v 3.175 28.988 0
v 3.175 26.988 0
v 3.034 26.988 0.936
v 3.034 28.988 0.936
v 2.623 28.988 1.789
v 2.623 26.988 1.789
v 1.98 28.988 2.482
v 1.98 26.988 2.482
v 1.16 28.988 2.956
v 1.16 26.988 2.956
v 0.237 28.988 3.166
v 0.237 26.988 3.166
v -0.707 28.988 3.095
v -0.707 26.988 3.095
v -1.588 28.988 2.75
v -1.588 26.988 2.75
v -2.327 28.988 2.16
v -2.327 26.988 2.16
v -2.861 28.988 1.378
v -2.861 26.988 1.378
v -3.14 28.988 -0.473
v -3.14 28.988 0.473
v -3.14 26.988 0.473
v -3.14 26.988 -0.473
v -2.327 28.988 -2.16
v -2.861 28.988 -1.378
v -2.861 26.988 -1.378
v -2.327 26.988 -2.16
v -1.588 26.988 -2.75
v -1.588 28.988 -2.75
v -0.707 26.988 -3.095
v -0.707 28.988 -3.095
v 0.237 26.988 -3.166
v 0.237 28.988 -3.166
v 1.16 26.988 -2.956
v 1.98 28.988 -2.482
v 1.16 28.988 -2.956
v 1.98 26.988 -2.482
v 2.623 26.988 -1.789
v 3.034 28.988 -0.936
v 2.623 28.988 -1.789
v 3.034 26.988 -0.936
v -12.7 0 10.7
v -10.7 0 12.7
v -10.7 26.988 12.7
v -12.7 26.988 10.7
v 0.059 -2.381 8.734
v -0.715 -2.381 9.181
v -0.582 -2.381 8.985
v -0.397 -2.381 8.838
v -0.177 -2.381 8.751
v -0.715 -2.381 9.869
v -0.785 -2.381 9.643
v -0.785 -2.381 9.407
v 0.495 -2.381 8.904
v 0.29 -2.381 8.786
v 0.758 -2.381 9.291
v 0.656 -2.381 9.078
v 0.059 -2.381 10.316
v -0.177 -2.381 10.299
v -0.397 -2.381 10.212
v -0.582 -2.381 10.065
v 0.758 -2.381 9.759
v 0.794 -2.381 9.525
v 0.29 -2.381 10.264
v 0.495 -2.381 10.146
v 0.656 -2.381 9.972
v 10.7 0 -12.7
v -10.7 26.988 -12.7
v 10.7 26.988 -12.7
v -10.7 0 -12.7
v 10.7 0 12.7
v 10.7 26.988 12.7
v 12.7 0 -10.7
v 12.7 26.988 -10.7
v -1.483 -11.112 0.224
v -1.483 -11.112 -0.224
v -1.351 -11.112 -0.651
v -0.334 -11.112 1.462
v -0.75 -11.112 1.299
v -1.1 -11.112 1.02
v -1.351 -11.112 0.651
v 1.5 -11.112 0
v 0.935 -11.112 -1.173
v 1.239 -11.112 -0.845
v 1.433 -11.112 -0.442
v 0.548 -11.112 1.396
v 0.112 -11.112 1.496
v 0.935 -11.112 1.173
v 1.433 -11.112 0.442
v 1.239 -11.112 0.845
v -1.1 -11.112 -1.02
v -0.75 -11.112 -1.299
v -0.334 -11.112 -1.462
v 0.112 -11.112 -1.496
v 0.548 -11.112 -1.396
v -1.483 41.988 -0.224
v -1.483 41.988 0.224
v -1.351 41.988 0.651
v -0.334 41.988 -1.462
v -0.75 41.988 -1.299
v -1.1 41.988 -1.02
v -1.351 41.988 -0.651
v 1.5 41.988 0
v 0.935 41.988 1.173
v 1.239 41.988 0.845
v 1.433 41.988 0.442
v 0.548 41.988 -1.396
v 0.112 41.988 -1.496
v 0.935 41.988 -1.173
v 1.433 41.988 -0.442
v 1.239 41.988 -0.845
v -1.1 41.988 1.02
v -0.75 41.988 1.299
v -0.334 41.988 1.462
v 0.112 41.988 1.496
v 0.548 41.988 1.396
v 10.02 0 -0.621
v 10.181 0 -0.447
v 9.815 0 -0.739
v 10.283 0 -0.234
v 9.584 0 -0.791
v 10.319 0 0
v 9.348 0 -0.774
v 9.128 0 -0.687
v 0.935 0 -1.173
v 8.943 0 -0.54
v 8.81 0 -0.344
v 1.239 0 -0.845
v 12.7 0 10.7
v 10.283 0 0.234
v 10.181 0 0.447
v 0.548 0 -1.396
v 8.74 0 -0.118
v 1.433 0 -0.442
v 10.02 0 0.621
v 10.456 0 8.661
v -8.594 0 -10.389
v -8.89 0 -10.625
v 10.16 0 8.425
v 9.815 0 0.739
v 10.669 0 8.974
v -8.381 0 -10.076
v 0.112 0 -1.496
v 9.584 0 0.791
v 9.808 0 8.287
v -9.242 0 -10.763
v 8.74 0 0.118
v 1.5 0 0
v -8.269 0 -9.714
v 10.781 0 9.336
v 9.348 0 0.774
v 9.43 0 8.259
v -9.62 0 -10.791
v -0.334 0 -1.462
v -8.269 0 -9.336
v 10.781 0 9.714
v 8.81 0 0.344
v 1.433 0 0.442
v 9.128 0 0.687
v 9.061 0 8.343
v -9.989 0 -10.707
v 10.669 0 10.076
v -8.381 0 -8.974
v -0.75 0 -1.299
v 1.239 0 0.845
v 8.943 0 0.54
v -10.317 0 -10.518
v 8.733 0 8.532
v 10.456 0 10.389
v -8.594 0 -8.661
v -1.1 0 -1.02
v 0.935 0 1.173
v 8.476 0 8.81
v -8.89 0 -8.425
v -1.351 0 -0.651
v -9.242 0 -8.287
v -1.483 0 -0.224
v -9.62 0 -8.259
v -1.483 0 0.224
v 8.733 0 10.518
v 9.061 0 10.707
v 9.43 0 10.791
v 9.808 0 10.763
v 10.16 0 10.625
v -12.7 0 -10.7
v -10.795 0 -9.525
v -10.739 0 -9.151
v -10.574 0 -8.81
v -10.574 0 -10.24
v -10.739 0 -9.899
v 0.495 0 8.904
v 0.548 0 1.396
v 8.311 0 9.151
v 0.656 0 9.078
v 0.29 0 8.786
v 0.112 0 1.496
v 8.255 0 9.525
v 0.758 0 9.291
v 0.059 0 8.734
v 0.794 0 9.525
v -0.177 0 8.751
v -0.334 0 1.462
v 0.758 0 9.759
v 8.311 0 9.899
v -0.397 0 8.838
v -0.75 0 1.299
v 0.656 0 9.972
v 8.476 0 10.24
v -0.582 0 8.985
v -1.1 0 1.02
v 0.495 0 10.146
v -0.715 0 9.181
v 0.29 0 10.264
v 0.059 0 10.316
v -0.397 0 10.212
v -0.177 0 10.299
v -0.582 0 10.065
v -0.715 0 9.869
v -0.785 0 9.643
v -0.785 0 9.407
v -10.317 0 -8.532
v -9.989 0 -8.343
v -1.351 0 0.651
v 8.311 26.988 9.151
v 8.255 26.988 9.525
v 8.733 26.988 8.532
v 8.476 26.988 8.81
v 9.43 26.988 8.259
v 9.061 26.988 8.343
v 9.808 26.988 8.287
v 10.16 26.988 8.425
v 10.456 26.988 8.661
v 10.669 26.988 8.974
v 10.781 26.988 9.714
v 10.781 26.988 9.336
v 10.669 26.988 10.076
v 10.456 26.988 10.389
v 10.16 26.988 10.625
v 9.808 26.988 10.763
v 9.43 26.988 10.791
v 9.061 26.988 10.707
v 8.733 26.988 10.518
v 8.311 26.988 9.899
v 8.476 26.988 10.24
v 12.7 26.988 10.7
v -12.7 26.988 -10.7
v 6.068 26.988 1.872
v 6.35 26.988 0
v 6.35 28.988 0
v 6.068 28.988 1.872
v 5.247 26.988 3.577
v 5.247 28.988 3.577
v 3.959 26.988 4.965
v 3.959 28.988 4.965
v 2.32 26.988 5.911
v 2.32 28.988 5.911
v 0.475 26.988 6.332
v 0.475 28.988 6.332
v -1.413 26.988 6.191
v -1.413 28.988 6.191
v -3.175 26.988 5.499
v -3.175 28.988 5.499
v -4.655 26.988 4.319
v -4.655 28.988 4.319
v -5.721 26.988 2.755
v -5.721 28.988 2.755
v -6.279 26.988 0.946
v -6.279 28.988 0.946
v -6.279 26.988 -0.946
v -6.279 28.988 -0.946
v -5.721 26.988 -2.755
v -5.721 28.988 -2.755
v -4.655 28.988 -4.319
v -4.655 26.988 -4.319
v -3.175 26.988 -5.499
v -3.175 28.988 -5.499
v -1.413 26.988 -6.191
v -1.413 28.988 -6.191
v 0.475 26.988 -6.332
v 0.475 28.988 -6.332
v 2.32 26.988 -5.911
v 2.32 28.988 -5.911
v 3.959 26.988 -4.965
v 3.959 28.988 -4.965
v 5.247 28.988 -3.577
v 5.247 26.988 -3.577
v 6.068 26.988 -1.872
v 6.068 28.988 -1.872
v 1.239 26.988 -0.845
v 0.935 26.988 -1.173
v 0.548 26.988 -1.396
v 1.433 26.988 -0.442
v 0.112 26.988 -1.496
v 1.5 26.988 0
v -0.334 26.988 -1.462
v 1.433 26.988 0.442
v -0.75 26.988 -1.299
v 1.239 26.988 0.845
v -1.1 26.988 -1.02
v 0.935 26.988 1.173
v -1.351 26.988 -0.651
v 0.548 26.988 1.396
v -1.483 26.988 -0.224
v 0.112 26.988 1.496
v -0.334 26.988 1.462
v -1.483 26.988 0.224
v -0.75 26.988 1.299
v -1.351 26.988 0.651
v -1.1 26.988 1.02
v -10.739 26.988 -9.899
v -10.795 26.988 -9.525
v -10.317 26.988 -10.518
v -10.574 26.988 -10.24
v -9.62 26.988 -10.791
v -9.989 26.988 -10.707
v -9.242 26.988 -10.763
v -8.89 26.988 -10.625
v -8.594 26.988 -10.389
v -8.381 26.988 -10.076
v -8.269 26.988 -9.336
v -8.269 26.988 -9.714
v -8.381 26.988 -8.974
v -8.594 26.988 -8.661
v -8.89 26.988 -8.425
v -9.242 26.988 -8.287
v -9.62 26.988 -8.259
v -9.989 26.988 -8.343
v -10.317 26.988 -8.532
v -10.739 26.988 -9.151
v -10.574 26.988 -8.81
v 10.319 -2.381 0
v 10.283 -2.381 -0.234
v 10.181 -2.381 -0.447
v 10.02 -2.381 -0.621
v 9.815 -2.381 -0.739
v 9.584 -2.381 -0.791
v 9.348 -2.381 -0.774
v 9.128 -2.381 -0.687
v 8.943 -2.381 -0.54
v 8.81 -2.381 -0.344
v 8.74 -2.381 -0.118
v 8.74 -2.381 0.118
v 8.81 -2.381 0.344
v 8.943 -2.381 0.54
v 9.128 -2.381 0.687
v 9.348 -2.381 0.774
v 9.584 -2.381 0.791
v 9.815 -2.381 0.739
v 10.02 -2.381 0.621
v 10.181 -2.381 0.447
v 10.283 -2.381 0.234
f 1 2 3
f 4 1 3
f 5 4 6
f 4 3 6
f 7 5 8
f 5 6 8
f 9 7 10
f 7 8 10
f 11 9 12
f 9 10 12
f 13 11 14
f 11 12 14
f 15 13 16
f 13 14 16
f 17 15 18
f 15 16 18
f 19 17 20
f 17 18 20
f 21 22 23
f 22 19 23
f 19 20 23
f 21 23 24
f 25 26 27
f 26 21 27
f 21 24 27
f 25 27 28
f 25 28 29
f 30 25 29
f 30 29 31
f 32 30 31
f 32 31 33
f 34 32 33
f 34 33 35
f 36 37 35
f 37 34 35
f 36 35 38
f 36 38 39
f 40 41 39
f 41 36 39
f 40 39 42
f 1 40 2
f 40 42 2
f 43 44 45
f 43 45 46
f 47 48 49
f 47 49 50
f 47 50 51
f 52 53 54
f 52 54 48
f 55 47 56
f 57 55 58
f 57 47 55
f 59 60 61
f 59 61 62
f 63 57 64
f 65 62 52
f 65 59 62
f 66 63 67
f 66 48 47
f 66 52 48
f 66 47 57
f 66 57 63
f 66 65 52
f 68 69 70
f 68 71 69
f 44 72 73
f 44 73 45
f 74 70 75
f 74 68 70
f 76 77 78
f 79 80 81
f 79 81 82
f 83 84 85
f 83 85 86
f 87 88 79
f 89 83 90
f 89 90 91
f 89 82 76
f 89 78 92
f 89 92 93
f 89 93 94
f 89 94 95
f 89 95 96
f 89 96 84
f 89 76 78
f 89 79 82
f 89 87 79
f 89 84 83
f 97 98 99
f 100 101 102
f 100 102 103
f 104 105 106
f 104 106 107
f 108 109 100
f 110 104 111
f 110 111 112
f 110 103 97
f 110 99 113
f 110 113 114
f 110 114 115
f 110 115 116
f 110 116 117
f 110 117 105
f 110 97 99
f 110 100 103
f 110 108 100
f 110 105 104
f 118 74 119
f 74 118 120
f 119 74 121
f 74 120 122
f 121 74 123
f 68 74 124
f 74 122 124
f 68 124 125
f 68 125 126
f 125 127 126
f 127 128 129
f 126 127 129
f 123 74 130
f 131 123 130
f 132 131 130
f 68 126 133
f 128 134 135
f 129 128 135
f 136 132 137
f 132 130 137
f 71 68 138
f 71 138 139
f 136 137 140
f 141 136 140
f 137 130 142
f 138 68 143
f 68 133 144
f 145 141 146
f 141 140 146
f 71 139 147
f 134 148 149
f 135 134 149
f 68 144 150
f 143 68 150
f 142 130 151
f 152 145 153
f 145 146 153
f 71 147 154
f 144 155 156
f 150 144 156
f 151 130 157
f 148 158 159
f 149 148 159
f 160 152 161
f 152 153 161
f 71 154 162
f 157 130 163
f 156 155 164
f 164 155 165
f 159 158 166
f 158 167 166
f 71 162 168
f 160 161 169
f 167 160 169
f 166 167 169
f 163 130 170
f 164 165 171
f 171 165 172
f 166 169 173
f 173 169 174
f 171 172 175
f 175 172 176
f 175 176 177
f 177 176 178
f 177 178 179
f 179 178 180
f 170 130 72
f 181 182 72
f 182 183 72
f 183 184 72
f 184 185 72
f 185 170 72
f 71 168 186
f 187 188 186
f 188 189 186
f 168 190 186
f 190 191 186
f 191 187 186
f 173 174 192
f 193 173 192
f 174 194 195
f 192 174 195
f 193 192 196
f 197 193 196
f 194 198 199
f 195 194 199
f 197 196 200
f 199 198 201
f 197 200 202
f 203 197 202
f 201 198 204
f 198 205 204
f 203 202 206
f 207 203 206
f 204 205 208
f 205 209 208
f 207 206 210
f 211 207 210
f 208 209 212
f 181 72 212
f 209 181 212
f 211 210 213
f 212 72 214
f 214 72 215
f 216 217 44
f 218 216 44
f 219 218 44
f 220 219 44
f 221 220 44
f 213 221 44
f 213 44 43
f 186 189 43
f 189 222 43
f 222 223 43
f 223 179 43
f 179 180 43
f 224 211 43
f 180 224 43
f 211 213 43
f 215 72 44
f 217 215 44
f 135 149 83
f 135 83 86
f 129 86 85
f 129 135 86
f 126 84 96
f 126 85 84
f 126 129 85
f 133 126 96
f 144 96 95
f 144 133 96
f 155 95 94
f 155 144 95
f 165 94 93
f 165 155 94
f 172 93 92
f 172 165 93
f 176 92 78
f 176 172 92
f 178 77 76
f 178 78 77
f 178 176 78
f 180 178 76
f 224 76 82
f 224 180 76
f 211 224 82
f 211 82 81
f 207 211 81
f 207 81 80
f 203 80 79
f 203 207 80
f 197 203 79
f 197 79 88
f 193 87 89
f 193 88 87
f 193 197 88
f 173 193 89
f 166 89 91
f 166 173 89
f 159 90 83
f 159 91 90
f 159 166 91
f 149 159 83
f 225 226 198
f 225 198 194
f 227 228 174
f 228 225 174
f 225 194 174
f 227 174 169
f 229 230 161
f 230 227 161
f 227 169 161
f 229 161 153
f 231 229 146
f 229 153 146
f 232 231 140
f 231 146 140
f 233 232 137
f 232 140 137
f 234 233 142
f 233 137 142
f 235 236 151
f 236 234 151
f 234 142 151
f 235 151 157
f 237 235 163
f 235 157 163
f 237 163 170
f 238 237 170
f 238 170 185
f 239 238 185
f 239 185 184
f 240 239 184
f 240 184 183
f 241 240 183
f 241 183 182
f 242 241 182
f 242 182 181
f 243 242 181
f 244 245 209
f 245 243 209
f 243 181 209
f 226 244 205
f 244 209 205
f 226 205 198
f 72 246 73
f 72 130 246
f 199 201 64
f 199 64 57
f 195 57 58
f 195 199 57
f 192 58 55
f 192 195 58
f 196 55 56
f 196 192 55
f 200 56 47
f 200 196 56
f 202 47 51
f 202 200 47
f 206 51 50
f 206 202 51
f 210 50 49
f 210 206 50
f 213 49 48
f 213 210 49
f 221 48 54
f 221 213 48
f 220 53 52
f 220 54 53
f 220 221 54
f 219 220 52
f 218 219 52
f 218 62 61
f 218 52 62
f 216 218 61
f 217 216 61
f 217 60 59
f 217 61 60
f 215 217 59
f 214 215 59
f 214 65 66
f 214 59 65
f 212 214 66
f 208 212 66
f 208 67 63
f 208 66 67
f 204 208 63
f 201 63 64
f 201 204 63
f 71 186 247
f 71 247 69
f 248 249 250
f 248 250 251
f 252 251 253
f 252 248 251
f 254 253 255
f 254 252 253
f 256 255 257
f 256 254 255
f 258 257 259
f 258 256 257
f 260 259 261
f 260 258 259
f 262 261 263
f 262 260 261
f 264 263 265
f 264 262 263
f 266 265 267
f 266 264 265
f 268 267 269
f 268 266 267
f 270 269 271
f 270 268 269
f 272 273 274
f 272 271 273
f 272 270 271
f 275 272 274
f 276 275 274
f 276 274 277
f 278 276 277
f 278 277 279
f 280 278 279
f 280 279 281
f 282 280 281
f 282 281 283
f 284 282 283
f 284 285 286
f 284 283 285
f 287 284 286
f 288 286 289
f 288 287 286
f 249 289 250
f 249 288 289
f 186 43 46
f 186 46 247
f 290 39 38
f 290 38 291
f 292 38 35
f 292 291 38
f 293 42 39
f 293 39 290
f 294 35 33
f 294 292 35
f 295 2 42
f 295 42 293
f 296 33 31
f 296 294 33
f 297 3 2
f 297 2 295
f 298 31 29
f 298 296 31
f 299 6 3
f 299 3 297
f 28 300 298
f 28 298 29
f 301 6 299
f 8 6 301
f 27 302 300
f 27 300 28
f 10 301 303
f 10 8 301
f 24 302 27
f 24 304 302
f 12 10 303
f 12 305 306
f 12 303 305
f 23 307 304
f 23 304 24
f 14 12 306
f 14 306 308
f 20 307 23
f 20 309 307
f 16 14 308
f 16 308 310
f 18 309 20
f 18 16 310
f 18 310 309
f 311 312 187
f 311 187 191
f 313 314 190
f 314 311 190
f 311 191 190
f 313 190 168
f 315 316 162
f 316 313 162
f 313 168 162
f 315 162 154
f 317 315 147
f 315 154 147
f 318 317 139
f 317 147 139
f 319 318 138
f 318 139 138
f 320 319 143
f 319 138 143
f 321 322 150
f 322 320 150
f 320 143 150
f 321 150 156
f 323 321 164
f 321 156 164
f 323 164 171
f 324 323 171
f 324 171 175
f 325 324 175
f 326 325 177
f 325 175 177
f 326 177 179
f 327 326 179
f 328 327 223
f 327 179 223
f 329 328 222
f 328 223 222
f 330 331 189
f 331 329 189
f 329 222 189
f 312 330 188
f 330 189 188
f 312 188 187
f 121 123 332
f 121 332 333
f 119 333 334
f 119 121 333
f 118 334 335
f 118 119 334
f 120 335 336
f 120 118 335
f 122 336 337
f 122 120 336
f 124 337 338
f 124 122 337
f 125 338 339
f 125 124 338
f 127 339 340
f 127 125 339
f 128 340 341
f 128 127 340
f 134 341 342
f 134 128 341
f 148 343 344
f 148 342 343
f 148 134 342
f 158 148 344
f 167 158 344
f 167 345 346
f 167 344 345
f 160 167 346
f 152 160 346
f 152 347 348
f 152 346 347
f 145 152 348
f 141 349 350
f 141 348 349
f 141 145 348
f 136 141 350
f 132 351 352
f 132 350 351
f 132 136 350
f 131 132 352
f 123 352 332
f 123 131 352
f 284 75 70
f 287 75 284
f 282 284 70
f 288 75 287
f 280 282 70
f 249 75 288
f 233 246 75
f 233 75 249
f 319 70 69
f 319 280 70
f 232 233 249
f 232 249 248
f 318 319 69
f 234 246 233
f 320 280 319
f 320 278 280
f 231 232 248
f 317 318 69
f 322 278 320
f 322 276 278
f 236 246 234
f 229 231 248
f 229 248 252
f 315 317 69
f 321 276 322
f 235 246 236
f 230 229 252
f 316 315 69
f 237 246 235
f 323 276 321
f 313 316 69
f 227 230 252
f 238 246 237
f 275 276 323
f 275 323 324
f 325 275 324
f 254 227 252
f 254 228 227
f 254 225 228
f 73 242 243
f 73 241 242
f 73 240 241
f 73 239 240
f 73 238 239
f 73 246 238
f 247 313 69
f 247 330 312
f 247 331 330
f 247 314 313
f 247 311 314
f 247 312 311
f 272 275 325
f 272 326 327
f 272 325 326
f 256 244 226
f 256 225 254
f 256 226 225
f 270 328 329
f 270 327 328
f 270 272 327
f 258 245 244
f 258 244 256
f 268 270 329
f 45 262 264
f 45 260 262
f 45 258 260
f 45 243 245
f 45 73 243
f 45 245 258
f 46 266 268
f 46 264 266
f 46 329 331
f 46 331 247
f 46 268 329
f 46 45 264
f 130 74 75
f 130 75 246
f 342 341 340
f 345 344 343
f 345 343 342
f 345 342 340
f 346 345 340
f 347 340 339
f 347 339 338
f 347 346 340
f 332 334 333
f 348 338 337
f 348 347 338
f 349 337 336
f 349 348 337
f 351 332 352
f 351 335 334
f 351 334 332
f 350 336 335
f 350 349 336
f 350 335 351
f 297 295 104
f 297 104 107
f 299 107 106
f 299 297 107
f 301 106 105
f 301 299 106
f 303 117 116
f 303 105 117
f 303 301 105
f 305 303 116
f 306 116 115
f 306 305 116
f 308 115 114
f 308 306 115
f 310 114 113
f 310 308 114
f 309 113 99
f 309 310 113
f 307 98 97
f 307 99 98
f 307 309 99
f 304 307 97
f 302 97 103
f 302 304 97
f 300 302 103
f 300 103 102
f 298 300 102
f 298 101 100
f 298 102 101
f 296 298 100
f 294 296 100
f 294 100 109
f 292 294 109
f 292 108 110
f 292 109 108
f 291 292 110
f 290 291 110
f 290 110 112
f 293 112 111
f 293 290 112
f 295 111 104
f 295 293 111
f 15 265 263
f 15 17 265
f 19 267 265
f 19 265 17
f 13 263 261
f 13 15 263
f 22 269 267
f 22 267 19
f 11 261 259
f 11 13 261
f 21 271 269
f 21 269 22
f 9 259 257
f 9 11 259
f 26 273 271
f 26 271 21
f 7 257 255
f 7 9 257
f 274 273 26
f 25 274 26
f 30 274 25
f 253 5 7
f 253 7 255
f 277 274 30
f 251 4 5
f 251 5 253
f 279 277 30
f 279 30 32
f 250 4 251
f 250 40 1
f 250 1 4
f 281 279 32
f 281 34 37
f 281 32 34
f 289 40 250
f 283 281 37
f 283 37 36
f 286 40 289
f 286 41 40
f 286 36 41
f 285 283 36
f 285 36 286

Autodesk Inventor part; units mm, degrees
ref_plane "YZ Plane" through (0, 0, 0) normal (1, 0, 0) x (0, 1, 0)
ref_plane "XZ Plane" through (0, 0, 0) normal (0, 1, 0) x (-1, 0, 0)
ref_plane "XY Plane" through (0, 0, 0) normal (0, 0, 1) x (1, 0, 0)
sketch "Sketch1" plane through (0, 0, 0) normal (0, 1, 0) x (-1, 0, 0)
  line L0 (10.7, -12.7) -> (-10.7, -12.7)
  line L1 (-12.7, -10.7) -> (-12.7, 10.7)
  line L2 (-10.7, 12.7) -> (10.7, 12.7)
  line L3 (12.7, 10.7) -> (12.7, -10.7)
  line L4 (12.7, -10.7) -> (10.7, -12.7)
  line L5 (-10.7, -12.7) -> (-12.7, -10.7)
  line L6 (-12.7, 10.7) -> (-10.7, 12.7)
  line L7 (10.7, 12.7) -> (12.7, 10.7)
  circle A0 centre (9.525, -9.525) radius 1.27
  circle A1 centre (-9.525, 9.525) radius 1.27
  point P0 (0, 0)
  point P1 (12.7, -12.7)
  point P2 (-12.7, 12.7)
  point P3 (-12.7, -12.7)
  point P4 (12.7, 12.7)
  dimension "d0" = 25.4
  dimension "d2" = 25.4
  dimension "d3" = 12.7
  dimension "d4" = 12.7
  dimension "d5" = 2
  dimension "d6" = 2
  dimension "d7" = 2
  dimension "d8" = 2
  dimension "d9" = 2
  dimension "d10" = 2
  dimension "d11" = 2
  dimension "d12" = 2
  dimension "d13" = 3.175
  dimension "d14" = 3.175
  dimension "d15" = 3.175
  dimension "d16" = 3.175
  dimension "d17" = 2.54
  dimension "d18" = 2.54
extrude "Extrusion1" add sketch "Sketch1" along normal blind 26.9875
sketch "Sketch2" plane through (0, 26.9875, 0) normal (0, 1, 0) x (1, 0, 0)
  circle A0 centre (0, 0) radius 6.35
  circle A1 centre (0, 0) radius 3.175
  dimension "d21" = 12.7
  dimension "d23" = 6.35
extrude "Extrusion2" add sketch "Sketch2" along normal blind 2
sketch "Sketch3" plane through (0, 26.9875, 0) normal (0, 1, 0) x (1, 0, 0)
  circle A0 centre (0, 0) radius 6.35 projected
  circle A1 centre (0, 0) radius 1.5
  dimension "d26" = 3
extrude "Extrusion3" add sketch "Sketch3" along normal blind 15 contours A1
sketch "Sketch4" plane through (0, 0, 0) normal (0, -1, 0) x (1, 0, 0)
  circle A0 centre (0, 0) radius 1.5
  dimension "d30" = 3
extrude "Extrusion4" add sketch "Sketch4" along normal blind 11.1125
sketch "Sketch5" plane through (0, 0, 0) normal (0, -1, 0) x (1, 0, 0)
  circle A0 centre (0, 0) radius 1.5 projected
  circle A1 centre (0, 9.525) radius 0.7937
  circle A2 centre (9.525, 0) radius 0.7937
  line L0 (0, 0) -> (0, 9.525) construction
  line L1 (0, 0) -> (9.525, 0) construction
  dimension "d34" = 9.525
  dimension "d35" = 9.525
  dimension "d36" = 1.5875
  dimension "d37" = 1.5875
extrude "Extrusion5" add sketch "Sketch5" along normal blind 2.3813 contours A1 | A2
equation "\"d3\" = 0.5 * d2"
equation "\"d4\" = 0.5 * d0"
equation "\"d6\" = d5"
equation "\"d7\" = d5"
equation "\"d8\" = d7"
equation "\"d9\" = d5"
equation "\"d10\" = d9"
equation "\"d11\" = d5"
equation "\"d12\" = d11"
properties part number "launcher_motor"
